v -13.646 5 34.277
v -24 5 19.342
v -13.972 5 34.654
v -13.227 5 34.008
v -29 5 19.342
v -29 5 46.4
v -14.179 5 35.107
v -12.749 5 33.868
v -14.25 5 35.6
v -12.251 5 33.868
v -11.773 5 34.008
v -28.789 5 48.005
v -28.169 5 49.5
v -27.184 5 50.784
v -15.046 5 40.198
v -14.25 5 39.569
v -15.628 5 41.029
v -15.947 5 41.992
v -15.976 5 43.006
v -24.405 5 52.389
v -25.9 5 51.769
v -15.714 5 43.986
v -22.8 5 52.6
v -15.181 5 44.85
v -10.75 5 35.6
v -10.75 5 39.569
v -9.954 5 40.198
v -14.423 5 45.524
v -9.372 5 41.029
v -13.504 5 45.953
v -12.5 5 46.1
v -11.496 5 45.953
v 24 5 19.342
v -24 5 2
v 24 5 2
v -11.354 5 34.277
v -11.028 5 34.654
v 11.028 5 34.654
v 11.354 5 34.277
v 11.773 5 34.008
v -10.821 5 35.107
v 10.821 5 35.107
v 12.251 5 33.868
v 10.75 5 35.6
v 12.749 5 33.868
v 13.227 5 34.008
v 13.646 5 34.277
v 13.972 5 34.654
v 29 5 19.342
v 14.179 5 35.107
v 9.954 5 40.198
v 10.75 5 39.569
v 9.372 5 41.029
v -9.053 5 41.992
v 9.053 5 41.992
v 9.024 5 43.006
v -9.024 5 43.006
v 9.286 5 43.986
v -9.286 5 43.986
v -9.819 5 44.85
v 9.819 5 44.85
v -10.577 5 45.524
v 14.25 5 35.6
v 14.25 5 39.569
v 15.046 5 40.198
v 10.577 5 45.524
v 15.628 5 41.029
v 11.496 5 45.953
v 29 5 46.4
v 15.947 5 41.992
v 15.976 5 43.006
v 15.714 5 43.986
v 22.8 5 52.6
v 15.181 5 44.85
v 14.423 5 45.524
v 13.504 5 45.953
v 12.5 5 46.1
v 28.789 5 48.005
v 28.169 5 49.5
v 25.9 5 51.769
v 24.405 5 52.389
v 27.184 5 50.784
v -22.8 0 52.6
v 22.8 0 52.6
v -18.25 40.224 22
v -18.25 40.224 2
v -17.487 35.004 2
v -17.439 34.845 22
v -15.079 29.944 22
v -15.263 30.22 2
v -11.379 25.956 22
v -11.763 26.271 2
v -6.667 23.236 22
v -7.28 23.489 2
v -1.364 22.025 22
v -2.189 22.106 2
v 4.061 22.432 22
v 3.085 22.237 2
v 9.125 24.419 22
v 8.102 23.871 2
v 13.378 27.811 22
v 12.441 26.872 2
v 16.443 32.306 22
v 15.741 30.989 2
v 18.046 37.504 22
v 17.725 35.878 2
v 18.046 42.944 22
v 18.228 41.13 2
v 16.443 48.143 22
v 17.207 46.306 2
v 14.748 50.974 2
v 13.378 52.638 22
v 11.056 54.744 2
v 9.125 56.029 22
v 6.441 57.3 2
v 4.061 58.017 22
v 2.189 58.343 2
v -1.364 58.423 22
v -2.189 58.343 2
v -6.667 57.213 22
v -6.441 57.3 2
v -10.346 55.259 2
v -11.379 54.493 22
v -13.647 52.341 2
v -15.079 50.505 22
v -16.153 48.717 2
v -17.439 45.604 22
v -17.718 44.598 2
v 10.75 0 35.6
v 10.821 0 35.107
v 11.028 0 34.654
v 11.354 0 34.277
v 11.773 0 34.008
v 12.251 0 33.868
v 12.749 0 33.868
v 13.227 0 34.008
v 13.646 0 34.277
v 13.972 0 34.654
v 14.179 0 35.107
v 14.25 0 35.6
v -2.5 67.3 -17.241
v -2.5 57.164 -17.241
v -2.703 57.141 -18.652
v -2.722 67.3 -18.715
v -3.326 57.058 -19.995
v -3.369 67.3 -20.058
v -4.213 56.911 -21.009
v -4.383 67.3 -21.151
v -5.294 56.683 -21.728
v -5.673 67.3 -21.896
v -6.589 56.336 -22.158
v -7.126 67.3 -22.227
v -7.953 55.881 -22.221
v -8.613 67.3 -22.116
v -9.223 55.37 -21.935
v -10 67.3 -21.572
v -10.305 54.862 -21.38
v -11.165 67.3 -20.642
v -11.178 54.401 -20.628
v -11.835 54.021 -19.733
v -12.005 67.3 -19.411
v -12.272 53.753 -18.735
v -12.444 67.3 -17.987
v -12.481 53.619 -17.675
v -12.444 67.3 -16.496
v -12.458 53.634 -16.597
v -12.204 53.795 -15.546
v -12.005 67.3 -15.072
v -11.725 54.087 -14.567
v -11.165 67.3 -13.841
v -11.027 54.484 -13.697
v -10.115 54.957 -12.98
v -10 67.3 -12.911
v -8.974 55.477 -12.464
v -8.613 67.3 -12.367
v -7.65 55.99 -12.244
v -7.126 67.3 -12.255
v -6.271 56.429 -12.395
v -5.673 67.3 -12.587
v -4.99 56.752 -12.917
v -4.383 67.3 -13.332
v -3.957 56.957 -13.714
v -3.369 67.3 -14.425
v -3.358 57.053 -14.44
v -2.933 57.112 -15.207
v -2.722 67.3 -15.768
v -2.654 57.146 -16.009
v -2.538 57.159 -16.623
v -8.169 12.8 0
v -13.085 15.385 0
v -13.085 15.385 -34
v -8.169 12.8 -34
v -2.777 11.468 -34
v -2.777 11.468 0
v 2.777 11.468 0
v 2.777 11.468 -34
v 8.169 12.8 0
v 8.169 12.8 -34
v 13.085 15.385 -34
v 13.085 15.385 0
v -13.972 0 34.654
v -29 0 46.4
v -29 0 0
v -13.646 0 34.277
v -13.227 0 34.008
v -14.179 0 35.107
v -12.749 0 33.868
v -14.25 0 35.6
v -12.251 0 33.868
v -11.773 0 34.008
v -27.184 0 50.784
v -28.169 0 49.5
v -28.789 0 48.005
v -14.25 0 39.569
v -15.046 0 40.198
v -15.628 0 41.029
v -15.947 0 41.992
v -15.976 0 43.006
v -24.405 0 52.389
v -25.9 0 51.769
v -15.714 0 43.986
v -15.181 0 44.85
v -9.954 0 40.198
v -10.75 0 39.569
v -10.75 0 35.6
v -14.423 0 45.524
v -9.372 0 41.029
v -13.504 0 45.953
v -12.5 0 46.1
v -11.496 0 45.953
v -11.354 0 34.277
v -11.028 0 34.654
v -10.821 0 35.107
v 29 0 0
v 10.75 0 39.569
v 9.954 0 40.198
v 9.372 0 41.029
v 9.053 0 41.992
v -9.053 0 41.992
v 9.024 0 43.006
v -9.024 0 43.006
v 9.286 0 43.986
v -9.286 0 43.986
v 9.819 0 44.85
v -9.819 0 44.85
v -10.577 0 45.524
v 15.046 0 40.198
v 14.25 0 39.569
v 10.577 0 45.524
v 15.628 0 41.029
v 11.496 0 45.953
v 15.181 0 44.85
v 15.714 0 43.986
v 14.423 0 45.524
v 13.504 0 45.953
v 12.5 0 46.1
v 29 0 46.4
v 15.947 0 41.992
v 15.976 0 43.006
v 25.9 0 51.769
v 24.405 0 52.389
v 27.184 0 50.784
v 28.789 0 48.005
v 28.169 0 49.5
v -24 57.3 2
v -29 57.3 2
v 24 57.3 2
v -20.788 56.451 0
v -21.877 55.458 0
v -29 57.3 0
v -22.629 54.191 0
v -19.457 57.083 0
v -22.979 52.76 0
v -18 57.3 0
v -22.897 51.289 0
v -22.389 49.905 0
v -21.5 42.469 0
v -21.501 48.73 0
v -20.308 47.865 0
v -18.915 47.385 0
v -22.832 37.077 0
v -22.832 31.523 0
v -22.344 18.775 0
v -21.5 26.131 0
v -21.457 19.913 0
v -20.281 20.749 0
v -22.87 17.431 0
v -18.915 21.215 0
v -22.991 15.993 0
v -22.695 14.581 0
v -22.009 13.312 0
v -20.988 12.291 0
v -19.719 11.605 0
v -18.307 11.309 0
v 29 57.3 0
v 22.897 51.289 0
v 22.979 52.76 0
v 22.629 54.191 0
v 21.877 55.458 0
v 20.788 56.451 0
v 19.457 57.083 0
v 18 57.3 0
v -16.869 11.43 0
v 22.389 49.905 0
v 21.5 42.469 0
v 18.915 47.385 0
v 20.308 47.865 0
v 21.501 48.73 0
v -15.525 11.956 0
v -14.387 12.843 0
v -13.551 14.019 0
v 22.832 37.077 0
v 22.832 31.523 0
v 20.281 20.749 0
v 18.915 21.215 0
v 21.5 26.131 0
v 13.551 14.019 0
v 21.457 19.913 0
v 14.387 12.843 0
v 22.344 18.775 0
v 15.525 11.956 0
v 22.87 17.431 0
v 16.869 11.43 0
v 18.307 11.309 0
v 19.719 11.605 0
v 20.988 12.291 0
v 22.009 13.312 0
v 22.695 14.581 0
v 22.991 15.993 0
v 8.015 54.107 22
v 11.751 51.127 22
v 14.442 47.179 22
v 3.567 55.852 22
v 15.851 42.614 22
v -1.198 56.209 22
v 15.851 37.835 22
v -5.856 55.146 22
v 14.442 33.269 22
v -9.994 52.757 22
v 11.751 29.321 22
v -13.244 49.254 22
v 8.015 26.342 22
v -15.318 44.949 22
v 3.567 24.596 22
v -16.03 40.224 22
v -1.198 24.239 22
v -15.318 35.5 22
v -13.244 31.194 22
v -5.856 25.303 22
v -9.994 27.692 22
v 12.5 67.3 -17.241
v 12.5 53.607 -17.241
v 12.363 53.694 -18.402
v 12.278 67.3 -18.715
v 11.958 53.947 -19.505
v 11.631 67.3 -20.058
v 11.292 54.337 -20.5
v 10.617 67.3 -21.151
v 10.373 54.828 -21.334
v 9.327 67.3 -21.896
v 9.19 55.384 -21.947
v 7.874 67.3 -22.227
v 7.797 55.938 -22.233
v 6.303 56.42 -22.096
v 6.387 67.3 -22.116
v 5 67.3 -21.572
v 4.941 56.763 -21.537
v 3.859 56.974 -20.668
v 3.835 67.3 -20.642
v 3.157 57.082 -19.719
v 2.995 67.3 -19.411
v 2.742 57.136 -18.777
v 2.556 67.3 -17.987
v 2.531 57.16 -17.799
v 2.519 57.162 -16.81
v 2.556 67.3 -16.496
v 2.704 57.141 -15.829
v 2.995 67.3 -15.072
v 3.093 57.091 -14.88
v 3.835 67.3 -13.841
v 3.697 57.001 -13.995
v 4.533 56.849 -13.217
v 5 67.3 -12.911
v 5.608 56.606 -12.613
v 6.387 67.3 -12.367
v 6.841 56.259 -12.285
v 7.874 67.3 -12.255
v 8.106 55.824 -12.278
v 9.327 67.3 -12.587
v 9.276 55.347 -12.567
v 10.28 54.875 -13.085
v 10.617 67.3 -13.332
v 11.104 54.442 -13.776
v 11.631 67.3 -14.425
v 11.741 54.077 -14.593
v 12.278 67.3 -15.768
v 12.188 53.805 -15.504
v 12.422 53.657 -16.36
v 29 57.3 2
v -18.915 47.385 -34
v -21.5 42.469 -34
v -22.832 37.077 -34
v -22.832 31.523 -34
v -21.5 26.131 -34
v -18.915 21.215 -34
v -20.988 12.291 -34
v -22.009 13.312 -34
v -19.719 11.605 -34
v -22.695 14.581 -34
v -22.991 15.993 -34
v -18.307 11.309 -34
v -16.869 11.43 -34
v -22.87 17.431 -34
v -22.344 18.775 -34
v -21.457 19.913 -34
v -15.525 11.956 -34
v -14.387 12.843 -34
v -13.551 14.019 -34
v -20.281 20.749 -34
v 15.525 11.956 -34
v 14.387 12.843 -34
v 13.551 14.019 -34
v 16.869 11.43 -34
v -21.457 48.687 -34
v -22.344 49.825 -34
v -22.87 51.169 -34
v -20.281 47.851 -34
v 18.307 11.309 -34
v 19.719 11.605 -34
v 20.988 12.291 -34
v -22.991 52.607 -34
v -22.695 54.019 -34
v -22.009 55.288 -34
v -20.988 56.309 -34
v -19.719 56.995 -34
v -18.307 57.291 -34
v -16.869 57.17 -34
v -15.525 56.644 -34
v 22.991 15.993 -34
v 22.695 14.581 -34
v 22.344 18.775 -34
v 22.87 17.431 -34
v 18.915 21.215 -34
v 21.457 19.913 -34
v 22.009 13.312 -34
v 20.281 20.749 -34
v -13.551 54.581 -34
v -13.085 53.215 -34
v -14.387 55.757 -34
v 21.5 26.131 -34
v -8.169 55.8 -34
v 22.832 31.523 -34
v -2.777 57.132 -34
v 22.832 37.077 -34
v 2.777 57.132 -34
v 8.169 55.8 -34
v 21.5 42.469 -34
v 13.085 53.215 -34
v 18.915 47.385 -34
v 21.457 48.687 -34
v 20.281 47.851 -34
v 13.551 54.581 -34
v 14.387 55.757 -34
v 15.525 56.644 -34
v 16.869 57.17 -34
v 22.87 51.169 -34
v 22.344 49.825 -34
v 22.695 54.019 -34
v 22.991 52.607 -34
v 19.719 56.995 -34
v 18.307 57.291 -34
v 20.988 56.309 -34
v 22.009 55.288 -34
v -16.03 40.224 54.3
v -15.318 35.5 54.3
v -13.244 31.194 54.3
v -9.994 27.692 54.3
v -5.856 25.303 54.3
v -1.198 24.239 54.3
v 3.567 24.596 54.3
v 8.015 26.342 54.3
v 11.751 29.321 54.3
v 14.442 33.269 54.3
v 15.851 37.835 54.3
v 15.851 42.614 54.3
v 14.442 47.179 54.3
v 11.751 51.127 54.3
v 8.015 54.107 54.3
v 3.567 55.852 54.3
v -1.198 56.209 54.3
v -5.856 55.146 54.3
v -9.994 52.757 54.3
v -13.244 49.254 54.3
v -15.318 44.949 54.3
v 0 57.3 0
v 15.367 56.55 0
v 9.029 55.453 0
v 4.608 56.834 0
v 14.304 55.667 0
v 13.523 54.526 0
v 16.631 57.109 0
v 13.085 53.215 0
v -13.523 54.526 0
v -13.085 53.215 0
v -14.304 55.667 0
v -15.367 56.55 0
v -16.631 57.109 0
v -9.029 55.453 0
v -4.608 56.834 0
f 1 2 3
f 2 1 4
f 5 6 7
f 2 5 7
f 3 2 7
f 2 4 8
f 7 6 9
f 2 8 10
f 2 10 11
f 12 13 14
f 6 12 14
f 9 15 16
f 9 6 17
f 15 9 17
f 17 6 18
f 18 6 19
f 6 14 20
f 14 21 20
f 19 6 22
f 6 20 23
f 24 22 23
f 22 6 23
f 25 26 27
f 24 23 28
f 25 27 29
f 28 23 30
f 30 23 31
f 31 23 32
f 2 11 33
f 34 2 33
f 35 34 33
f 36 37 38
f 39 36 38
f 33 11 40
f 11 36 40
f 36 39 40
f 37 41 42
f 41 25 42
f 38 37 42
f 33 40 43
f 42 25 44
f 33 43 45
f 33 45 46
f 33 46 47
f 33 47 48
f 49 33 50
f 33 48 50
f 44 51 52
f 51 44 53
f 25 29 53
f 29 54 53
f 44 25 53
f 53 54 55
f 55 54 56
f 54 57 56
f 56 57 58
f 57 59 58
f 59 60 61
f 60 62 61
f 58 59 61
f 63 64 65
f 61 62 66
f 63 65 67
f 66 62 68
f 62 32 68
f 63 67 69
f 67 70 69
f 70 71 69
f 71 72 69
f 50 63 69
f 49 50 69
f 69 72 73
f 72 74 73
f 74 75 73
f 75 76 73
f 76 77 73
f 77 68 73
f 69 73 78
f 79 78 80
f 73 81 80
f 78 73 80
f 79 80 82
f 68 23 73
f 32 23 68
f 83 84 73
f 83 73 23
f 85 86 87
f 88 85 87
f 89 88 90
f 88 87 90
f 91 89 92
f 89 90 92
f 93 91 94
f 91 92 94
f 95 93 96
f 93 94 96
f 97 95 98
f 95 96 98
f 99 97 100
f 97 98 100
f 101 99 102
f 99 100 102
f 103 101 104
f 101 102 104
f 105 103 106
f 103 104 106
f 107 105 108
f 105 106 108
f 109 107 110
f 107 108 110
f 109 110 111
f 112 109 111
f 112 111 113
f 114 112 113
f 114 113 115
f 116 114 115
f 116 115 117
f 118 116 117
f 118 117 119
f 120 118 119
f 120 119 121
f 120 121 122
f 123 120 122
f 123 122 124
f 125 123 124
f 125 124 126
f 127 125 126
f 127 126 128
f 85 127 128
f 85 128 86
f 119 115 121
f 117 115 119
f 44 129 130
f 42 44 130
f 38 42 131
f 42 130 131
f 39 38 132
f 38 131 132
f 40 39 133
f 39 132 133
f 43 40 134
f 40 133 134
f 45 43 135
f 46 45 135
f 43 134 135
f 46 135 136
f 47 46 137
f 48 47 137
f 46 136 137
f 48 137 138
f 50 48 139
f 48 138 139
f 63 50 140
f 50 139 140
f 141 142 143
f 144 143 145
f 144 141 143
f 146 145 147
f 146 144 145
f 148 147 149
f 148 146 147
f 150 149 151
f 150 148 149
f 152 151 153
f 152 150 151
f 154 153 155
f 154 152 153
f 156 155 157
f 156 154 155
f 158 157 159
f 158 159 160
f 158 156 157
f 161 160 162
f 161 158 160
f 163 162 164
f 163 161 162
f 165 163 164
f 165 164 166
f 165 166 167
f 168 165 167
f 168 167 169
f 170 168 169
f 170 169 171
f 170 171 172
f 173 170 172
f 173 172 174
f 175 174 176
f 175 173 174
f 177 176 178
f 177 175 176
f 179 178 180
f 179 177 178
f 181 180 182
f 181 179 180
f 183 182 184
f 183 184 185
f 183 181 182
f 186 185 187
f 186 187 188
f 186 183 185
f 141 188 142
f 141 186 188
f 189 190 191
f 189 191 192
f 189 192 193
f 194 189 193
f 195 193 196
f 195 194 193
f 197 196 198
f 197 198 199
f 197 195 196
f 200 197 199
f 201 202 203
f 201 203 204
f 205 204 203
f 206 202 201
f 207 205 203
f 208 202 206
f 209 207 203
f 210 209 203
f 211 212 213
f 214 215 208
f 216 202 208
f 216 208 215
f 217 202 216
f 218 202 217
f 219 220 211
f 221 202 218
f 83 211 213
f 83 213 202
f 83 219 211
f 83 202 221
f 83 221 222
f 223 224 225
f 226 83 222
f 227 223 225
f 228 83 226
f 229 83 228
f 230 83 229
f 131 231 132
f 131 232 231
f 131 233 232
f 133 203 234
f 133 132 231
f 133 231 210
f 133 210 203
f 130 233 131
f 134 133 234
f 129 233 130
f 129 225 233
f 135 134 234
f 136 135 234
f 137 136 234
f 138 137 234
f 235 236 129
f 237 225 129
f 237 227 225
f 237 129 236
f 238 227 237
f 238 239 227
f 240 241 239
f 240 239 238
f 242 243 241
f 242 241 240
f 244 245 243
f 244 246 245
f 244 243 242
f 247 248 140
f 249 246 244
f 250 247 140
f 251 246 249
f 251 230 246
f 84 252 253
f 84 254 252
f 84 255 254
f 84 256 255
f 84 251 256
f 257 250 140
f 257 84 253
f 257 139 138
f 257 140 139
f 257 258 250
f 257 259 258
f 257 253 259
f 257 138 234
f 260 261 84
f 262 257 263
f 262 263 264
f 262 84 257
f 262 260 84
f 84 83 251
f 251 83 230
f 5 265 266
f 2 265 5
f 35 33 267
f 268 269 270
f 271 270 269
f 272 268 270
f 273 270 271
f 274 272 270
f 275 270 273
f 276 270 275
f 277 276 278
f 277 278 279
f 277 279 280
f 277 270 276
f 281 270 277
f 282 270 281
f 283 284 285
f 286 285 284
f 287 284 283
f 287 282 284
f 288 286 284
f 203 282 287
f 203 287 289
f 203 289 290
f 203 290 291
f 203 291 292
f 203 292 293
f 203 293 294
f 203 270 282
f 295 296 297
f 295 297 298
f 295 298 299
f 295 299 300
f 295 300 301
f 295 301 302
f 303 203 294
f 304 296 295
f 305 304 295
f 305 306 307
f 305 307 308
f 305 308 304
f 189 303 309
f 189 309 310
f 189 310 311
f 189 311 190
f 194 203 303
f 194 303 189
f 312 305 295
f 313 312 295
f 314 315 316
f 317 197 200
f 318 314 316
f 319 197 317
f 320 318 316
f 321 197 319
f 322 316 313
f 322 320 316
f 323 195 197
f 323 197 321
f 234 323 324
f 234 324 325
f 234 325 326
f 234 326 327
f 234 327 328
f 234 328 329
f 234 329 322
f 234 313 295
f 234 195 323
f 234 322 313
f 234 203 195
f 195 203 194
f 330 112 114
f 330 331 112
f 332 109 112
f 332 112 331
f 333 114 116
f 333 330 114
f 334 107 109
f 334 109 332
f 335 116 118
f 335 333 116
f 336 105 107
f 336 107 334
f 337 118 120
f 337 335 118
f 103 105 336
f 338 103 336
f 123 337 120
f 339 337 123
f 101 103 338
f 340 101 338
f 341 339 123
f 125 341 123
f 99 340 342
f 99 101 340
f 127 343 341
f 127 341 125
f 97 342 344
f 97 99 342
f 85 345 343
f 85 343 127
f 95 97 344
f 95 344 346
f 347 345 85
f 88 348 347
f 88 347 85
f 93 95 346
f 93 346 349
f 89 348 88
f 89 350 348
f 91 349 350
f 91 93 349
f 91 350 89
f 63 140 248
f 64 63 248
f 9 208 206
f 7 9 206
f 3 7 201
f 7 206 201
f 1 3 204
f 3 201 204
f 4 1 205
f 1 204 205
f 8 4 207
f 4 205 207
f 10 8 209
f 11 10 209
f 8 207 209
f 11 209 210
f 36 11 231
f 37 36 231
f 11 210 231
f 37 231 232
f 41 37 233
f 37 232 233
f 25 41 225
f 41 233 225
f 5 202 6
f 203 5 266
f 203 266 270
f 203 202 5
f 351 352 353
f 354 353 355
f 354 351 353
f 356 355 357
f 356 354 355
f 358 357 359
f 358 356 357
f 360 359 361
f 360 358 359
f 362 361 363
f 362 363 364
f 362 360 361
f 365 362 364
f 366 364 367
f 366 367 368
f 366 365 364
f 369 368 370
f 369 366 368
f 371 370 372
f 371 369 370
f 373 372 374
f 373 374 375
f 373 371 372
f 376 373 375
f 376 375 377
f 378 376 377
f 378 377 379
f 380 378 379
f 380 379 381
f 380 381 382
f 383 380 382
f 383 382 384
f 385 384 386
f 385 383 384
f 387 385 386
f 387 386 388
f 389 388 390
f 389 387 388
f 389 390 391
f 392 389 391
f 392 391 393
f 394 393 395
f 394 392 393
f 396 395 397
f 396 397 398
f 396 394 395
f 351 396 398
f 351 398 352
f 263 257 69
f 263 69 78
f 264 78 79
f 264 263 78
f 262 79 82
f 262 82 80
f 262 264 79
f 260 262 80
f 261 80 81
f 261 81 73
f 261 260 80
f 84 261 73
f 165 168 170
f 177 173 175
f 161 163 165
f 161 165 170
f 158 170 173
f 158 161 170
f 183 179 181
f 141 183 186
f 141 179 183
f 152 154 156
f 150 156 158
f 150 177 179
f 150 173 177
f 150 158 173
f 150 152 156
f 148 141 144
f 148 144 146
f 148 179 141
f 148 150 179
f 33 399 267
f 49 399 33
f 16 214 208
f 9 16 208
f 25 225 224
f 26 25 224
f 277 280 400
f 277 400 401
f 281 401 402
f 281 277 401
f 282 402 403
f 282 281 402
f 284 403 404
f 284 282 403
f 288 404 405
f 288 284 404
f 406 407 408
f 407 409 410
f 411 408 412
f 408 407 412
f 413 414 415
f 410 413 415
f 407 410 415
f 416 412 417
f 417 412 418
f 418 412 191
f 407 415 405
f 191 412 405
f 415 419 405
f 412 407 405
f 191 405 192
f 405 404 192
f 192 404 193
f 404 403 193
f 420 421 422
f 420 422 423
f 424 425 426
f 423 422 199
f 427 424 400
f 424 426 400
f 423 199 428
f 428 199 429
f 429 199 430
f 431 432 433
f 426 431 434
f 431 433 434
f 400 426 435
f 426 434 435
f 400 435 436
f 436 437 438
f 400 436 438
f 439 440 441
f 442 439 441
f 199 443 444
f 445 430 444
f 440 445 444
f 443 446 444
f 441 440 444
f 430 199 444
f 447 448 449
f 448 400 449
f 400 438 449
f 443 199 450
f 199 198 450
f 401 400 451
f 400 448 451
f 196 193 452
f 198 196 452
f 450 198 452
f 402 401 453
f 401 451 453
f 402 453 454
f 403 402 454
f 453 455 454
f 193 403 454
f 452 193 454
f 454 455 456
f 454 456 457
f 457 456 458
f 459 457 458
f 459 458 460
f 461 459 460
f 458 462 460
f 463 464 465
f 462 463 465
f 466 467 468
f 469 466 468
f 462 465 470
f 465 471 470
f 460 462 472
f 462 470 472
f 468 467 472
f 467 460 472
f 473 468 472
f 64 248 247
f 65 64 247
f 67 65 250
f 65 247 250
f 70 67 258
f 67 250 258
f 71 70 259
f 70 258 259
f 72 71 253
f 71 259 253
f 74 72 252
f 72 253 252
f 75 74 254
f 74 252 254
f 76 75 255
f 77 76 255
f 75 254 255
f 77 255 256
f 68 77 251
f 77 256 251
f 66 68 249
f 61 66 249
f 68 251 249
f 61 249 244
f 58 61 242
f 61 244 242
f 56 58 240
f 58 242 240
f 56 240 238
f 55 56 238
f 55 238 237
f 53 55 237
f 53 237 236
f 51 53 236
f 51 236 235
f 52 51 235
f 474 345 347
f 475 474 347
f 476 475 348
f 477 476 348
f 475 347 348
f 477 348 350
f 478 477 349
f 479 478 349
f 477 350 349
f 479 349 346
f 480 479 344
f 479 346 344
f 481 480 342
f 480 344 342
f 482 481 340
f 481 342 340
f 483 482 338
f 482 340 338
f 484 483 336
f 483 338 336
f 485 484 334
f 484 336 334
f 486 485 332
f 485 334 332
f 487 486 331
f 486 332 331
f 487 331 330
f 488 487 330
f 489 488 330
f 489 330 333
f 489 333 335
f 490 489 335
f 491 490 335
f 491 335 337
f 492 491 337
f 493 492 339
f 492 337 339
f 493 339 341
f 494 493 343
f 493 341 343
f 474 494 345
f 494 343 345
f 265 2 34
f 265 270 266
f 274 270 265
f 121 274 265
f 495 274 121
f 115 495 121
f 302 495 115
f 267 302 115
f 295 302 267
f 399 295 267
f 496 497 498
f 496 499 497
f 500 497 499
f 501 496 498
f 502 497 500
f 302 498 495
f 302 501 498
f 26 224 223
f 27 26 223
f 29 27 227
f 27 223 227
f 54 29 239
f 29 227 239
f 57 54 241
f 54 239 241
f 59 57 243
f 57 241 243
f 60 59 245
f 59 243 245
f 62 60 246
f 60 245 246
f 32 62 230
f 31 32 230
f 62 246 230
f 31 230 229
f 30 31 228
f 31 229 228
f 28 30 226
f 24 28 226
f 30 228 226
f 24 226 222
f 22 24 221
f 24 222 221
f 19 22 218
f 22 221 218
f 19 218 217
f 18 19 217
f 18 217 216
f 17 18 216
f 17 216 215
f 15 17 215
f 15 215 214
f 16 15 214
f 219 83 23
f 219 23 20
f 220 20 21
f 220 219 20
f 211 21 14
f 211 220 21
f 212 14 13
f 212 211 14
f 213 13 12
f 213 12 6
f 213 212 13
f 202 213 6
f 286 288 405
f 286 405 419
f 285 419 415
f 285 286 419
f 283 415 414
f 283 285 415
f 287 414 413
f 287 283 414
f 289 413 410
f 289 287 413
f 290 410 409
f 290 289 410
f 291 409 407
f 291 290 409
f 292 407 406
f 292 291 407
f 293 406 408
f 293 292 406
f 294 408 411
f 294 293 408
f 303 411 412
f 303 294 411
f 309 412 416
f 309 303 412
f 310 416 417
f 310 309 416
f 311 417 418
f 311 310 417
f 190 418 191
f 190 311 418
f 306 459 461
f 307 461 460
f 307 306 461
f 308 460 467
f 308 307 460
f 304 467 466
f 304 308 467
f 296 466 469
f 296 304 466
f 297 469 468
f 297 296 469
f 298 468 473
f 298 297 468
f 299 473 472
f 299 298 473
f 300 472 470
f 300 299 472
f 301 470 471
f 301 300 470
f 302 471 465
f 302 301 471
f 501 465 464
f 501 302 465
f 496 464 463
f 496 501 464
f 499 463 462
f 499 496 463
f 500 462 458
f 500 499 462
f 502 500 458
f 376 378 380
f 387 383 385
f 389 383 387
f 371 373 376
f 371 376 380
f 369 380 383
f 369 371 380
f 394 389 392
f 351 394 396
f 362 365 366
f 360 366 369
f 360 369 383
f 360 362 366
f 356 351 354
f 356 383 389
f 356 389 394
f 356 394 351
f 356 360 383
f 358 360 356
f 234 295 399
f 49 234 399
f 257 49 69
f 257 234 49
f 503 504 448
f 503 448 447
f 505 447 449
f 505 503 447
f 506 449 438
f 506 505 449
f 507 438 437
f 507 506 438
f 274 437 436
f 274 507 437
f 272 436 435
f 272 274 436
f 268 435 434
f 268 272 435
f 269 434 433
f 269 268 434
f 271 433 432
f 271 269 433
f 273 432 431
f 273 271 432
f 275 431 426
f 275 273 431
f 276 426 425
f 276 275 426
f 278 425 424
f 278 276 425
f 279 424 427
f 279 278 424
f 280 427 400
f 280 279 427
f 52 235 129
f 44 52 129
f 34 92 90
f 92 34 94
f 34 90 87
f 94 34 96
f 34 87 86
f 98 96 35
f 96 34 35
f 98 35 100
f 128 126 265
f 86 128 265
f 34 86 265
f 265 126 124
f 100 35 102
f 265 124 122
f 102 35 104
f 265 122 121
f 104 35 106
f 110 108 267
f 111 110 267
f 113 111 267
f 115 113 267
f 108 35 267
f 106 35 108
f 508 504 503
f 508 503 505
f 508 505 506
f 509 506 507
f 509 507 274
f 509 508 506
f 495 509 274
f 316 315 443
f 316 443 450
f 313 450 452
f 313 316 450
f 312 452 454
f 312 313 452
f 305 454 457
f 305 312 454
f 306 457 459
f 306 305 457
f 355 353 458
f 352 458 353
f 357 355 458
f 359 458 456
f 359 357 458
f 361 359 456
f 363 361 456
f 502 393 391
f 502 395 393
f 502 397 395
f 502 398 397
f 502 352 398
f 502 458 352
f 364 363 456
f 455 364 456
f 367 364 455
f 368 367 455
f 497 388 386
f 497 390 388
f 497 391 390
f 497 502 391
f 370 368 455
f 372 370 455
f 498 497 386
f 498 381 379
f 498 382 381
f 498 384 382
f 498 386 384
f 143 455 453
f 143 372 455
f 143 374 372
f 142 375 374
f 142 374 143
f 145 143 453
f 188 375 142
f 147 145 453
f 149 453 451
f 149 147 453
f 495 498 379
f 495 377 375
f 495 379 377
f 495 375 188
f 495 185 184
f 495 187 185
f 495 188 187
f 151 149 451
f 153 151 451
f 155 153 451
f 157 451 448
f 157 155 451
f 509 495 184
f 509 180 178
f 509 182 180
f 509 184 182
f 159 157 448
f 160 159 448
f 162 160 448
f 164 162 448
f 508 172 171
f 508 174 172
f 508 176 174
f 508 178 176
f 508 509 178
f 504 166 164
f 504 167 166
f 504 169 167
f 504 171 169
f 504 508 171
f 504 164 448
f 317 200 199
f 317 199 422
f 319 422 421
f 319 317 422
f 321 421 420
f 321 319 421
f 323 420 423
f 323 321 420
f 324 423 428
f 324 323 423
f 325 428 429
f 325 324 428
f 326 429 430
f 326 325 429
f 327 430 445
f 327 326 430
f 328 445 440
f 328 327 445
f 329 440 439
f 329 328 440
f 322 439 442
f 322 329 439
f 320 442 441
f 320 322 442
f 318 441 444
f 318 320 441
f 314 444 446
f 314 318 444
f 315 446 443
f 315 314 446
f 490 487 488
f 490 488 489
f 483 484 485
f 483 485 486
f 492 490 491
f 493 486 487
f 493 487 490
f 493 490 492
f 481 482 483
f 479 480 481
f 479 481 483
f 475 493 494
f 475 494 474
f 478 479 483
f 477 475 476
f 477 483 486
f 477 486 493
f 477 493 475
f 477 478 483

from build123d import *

# Parameters (mm, degrees)
PAD_DEPTH    = 5
PAD001_DEPTH = 29
SKETCH002_W  = 52.3
SKETCH002_H  = 29.470448
POCKET_DEPTH = 24
PAD002_DEPTH = 34
SKETCH004_R  = 18.25
PAD003_DEPTH = 20
SKETCH005_R  = 16.029802
PAD004_DEPTH = 32.3
SKETCH006_R  = 5
PAD005_DEPTH = 10


with BuildPart() as part:
    # Sketch → Pad (new body)
    with BuildSketch(Plane.XZ):
        with BuildLine():
            Line((29, 0), (29, 46.4))
            ThreePointArc((29, 46.4), (27.184062, 50.784062), (22.8, 52.6))
            Line((22.8, 52.6), (-22.8, 52.6))
            ThreePointArc((-22.8, 52.6), (-27.184062, 50.784062), (-29, 46.4))
            Line((-29, 46.4), (-29, 0))
            Line((-29, 0), (29, 0))
        make_face()
        with BuildLine():
            ThreePointArc((-10.75, 39.568911), (-12.5, 46.1), (-14.25, 39.568911))
            Line((-14.25, 39.568911), (-14.25, 35.6))
            ThreePointArc((-14.25, 35.6), (-12.5, 33.85), (-10.75, 35.6))
            Line((-10.75, 35.6), (-10.75, 39.568911))
        make_face(mode=Mode.SUBTRACT)
        with BuildLine():
            ThreePointArc((14.25, 39.568911), (12.5, 46.1), (10.75, 39.568911))
            Line((10.75, 39.568911), (10.75, 35.6))
            ThreePointArc((10.75, 35.6), (12.5, 33.85), (14.25, 35.6))
            Line((14.25, 35.6), (14.25, 39.568911))
        make_face(mode=Mode.SUBTRACT)
    extrude(amount=-PAD_DEPTH)

    # Sketch001 → Pad001 (join, symmetric)
    with BuildSketch(Plane.YZ):
        Polygon((0, 0), (57.3, 0), (57.3, 2), (0, 21), align=None)
    extrude(amount=PAD001_DEPTH, both=True)

    # Sketch002 → Pocket (cut, symmetric)
    with BuildSketch(Plane.YZ):
        with Locations((31.15, 16.735224)):
            Rectangle(SKETCH002_W, SKETCH002_H)
    extrude(amount=POCKET_DEPTH, both=True, mode=Mode.SUBTRACT)

    # Sketch003 → Pad002 (join)
    with BuildSketch(Plane.XY):
        with BuildLine():
            ThreePointArc((-13.084524, 53.215476), (-21.535534, 55.835534), (-18.915476, 47.384524))
            ThreePointArc((-18.915476, 47.384524), (-23, 34.3), (-18.915476, 21.215476))
            ThreePointArc((-18.915476, 21.215476), (-21.535534, 12.764466), (-13.084524, 15.384524))
            ThreePointArc((-13.084524, 15.384524), (0, 11.3), (13.084524, 15.384524))
            ThreePointArc((13.084524, 15.384524), (21.535534, 12.764466), (18.915476, 21.215476))
            ThreePointArc((18.915476, 21.215476), (23, 34.3), (18.915476, 47.384524))
            ThreePointArc((18.915476, 47.384524), (21.535534, 55.835534), (13.084524, 53.215476))
            ThreePointArc((13.084524, 53.215476), (0, 57.3), (-13.084524, 53.215476))
        make_face()
    extrude(amount=-PAD002_DEPTH)

    # Sketch004 (on Face30 of Pad002) → Pad003 (join)
    with BuildSketch(Plane(origin=(0, 0, 2), x_dir=(-1, 0, 0), z_dir=(0, 0, 1))):
        with Locations((0, -40.224388)):
            Circle(SKETCH004_R)
    extrude(amount=PAD003_DEPTH)

    # Sketch005 (on Face44 of Pad003) → Pad004 (join)
    with BuildSketch(Plane(origin=(0, 0, 22), x_dir=(-1, 0, 0), z_dir=(0, 0, 1))):
        with Locations((0, -40.224388)):
            Circle(SKETCH005_R)
    extrude(amount=PAD004_DEPTH)

    # Sketch006 (on Face11 of Pad004) → Pad005 (join, symmetric)
    with BuildSketch(Plane(origin=(0, 57.3, 0), x_dir=(1, 0, 0), z_dir=(0, 1, 0))):
        with Locations((-7.5, 17.241444)):
            Circle(SKETCH006_R)
        with Locations((7.5, 17.241444)):
            Circle(SKETCH006_R)
    extrude(amount=PAD005_DEPTH, both=True)


solid = part.part
